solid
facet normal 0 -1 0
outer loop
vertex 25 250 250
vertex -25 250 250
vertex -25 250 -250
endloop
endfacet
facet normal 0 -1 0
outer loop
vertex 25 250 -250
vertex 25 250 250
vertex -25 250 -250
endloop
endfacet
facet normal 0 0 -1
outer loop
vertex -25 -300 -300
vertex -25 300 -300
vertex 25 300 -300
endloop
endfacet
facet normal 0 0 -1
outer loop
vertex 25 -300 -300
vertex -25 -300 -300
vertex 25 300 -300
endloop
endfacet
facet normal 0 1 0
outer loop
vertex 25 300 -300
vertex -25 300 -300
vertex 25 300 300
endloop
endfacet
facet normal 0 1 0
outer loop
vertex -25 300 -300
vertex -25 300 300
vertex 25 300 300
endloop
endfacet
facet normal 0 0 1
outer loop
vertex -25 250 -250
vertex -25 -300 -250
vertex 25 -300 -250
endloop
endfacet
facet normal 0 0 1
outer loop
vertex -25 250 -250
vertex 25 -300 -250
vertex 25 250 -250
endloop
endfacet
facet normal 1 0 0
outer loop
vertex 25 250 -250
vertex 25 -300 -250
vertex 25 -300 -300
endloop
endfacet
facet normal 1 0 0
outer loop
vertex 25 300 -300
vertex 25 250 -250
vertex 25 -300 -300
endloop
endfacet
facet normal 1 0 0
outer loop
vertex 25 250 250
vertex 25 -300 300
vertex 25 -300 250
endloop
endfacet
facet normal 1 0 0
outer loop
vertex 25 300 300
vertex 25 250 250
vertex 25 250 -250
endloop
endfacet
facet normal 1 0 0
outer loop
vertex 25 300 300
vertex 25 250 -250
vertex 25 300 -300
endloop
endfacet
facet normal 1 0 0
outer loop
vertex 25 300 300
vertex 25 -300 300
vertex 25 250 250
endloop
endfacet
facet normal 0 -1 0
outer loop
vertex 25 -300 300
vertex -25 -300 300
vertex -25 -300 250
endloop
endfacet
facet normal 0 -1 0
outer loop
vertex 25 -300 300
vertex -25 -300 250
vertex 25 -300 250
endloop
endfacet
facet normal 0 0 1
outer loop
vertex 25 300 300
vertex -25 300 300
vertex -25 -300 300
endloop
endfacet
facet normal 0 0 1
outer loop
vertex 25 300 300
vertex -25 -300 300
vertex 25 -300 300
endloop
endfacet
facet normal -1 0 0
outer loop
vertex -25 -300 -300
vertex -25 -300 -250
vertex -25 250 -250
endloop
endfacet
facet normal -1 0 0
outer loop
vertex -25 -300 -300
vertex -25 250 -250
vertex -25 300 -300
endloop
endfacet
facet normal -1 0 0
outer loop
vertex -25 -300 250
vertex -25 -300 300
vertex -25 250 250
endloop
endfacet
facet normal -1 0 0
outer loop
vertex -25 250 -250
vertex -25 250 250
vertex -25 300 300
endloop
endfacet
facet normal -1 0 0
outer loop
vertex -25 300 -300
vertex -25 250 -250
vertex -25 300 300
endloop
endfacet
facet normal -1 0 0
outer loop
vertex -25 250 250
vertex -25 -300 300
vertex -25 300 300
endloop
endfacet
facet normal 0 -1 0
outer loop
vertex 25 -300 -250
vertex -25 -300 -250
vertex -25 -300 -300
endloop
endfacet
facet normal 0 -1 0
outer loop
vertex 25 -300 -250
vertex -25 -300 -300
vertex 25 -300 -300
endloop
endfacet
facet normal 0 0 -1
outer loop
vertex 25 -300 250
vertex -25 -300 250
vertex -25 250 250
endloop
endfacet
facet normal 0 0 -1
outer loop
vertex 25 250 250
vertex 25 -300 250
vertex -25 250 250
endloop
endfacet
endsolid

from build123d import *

# Parameters (mm, degrees)
SKETCH1_W               = 50
SKETCH1_H               = 600
BOSS_EXTRUDE1_DEPTH     = 300
CUT_EXTRUDE1_DEPTH      = 428.200187266
CUT_EXTRUDE1_DEPTH_BACK = 428.200187266
SKETCH2_W               = 500
SKETCH2_H               = 550


with BuildPart() as part:
    # Sketch1 → Boss-Extrude1 (new, symmetric)
    with BuildSketch(Plane.XY):
        Rectangle(SKETCH1_W, SKETCH1_H)
    extrude(amount=BOSS_EXTRUDE1_DEPTH, both=True)

    # Sketch2 → Cut-Extrude1 (cut, two sides: drawn at the far end of the back side and taken through both)
    with BuildSketch(Plane(origin=(25, 0, 0), x_dir=(0, 0, -1), z_dir=(1, 0, 0)).offset(-CUT_EXTRUDE1_DEPTH_BACK)):
        with Locations((0, -25)):
            Rectangle(SKETCH2_W, SKETCH2_H)
    extrude(amount=CUT_EXTRUDE1_DEPTH + CUT_EXTRUDE1_DEPTH_BACK, mode=Mode.SUBTRACT)


solid = part.part
